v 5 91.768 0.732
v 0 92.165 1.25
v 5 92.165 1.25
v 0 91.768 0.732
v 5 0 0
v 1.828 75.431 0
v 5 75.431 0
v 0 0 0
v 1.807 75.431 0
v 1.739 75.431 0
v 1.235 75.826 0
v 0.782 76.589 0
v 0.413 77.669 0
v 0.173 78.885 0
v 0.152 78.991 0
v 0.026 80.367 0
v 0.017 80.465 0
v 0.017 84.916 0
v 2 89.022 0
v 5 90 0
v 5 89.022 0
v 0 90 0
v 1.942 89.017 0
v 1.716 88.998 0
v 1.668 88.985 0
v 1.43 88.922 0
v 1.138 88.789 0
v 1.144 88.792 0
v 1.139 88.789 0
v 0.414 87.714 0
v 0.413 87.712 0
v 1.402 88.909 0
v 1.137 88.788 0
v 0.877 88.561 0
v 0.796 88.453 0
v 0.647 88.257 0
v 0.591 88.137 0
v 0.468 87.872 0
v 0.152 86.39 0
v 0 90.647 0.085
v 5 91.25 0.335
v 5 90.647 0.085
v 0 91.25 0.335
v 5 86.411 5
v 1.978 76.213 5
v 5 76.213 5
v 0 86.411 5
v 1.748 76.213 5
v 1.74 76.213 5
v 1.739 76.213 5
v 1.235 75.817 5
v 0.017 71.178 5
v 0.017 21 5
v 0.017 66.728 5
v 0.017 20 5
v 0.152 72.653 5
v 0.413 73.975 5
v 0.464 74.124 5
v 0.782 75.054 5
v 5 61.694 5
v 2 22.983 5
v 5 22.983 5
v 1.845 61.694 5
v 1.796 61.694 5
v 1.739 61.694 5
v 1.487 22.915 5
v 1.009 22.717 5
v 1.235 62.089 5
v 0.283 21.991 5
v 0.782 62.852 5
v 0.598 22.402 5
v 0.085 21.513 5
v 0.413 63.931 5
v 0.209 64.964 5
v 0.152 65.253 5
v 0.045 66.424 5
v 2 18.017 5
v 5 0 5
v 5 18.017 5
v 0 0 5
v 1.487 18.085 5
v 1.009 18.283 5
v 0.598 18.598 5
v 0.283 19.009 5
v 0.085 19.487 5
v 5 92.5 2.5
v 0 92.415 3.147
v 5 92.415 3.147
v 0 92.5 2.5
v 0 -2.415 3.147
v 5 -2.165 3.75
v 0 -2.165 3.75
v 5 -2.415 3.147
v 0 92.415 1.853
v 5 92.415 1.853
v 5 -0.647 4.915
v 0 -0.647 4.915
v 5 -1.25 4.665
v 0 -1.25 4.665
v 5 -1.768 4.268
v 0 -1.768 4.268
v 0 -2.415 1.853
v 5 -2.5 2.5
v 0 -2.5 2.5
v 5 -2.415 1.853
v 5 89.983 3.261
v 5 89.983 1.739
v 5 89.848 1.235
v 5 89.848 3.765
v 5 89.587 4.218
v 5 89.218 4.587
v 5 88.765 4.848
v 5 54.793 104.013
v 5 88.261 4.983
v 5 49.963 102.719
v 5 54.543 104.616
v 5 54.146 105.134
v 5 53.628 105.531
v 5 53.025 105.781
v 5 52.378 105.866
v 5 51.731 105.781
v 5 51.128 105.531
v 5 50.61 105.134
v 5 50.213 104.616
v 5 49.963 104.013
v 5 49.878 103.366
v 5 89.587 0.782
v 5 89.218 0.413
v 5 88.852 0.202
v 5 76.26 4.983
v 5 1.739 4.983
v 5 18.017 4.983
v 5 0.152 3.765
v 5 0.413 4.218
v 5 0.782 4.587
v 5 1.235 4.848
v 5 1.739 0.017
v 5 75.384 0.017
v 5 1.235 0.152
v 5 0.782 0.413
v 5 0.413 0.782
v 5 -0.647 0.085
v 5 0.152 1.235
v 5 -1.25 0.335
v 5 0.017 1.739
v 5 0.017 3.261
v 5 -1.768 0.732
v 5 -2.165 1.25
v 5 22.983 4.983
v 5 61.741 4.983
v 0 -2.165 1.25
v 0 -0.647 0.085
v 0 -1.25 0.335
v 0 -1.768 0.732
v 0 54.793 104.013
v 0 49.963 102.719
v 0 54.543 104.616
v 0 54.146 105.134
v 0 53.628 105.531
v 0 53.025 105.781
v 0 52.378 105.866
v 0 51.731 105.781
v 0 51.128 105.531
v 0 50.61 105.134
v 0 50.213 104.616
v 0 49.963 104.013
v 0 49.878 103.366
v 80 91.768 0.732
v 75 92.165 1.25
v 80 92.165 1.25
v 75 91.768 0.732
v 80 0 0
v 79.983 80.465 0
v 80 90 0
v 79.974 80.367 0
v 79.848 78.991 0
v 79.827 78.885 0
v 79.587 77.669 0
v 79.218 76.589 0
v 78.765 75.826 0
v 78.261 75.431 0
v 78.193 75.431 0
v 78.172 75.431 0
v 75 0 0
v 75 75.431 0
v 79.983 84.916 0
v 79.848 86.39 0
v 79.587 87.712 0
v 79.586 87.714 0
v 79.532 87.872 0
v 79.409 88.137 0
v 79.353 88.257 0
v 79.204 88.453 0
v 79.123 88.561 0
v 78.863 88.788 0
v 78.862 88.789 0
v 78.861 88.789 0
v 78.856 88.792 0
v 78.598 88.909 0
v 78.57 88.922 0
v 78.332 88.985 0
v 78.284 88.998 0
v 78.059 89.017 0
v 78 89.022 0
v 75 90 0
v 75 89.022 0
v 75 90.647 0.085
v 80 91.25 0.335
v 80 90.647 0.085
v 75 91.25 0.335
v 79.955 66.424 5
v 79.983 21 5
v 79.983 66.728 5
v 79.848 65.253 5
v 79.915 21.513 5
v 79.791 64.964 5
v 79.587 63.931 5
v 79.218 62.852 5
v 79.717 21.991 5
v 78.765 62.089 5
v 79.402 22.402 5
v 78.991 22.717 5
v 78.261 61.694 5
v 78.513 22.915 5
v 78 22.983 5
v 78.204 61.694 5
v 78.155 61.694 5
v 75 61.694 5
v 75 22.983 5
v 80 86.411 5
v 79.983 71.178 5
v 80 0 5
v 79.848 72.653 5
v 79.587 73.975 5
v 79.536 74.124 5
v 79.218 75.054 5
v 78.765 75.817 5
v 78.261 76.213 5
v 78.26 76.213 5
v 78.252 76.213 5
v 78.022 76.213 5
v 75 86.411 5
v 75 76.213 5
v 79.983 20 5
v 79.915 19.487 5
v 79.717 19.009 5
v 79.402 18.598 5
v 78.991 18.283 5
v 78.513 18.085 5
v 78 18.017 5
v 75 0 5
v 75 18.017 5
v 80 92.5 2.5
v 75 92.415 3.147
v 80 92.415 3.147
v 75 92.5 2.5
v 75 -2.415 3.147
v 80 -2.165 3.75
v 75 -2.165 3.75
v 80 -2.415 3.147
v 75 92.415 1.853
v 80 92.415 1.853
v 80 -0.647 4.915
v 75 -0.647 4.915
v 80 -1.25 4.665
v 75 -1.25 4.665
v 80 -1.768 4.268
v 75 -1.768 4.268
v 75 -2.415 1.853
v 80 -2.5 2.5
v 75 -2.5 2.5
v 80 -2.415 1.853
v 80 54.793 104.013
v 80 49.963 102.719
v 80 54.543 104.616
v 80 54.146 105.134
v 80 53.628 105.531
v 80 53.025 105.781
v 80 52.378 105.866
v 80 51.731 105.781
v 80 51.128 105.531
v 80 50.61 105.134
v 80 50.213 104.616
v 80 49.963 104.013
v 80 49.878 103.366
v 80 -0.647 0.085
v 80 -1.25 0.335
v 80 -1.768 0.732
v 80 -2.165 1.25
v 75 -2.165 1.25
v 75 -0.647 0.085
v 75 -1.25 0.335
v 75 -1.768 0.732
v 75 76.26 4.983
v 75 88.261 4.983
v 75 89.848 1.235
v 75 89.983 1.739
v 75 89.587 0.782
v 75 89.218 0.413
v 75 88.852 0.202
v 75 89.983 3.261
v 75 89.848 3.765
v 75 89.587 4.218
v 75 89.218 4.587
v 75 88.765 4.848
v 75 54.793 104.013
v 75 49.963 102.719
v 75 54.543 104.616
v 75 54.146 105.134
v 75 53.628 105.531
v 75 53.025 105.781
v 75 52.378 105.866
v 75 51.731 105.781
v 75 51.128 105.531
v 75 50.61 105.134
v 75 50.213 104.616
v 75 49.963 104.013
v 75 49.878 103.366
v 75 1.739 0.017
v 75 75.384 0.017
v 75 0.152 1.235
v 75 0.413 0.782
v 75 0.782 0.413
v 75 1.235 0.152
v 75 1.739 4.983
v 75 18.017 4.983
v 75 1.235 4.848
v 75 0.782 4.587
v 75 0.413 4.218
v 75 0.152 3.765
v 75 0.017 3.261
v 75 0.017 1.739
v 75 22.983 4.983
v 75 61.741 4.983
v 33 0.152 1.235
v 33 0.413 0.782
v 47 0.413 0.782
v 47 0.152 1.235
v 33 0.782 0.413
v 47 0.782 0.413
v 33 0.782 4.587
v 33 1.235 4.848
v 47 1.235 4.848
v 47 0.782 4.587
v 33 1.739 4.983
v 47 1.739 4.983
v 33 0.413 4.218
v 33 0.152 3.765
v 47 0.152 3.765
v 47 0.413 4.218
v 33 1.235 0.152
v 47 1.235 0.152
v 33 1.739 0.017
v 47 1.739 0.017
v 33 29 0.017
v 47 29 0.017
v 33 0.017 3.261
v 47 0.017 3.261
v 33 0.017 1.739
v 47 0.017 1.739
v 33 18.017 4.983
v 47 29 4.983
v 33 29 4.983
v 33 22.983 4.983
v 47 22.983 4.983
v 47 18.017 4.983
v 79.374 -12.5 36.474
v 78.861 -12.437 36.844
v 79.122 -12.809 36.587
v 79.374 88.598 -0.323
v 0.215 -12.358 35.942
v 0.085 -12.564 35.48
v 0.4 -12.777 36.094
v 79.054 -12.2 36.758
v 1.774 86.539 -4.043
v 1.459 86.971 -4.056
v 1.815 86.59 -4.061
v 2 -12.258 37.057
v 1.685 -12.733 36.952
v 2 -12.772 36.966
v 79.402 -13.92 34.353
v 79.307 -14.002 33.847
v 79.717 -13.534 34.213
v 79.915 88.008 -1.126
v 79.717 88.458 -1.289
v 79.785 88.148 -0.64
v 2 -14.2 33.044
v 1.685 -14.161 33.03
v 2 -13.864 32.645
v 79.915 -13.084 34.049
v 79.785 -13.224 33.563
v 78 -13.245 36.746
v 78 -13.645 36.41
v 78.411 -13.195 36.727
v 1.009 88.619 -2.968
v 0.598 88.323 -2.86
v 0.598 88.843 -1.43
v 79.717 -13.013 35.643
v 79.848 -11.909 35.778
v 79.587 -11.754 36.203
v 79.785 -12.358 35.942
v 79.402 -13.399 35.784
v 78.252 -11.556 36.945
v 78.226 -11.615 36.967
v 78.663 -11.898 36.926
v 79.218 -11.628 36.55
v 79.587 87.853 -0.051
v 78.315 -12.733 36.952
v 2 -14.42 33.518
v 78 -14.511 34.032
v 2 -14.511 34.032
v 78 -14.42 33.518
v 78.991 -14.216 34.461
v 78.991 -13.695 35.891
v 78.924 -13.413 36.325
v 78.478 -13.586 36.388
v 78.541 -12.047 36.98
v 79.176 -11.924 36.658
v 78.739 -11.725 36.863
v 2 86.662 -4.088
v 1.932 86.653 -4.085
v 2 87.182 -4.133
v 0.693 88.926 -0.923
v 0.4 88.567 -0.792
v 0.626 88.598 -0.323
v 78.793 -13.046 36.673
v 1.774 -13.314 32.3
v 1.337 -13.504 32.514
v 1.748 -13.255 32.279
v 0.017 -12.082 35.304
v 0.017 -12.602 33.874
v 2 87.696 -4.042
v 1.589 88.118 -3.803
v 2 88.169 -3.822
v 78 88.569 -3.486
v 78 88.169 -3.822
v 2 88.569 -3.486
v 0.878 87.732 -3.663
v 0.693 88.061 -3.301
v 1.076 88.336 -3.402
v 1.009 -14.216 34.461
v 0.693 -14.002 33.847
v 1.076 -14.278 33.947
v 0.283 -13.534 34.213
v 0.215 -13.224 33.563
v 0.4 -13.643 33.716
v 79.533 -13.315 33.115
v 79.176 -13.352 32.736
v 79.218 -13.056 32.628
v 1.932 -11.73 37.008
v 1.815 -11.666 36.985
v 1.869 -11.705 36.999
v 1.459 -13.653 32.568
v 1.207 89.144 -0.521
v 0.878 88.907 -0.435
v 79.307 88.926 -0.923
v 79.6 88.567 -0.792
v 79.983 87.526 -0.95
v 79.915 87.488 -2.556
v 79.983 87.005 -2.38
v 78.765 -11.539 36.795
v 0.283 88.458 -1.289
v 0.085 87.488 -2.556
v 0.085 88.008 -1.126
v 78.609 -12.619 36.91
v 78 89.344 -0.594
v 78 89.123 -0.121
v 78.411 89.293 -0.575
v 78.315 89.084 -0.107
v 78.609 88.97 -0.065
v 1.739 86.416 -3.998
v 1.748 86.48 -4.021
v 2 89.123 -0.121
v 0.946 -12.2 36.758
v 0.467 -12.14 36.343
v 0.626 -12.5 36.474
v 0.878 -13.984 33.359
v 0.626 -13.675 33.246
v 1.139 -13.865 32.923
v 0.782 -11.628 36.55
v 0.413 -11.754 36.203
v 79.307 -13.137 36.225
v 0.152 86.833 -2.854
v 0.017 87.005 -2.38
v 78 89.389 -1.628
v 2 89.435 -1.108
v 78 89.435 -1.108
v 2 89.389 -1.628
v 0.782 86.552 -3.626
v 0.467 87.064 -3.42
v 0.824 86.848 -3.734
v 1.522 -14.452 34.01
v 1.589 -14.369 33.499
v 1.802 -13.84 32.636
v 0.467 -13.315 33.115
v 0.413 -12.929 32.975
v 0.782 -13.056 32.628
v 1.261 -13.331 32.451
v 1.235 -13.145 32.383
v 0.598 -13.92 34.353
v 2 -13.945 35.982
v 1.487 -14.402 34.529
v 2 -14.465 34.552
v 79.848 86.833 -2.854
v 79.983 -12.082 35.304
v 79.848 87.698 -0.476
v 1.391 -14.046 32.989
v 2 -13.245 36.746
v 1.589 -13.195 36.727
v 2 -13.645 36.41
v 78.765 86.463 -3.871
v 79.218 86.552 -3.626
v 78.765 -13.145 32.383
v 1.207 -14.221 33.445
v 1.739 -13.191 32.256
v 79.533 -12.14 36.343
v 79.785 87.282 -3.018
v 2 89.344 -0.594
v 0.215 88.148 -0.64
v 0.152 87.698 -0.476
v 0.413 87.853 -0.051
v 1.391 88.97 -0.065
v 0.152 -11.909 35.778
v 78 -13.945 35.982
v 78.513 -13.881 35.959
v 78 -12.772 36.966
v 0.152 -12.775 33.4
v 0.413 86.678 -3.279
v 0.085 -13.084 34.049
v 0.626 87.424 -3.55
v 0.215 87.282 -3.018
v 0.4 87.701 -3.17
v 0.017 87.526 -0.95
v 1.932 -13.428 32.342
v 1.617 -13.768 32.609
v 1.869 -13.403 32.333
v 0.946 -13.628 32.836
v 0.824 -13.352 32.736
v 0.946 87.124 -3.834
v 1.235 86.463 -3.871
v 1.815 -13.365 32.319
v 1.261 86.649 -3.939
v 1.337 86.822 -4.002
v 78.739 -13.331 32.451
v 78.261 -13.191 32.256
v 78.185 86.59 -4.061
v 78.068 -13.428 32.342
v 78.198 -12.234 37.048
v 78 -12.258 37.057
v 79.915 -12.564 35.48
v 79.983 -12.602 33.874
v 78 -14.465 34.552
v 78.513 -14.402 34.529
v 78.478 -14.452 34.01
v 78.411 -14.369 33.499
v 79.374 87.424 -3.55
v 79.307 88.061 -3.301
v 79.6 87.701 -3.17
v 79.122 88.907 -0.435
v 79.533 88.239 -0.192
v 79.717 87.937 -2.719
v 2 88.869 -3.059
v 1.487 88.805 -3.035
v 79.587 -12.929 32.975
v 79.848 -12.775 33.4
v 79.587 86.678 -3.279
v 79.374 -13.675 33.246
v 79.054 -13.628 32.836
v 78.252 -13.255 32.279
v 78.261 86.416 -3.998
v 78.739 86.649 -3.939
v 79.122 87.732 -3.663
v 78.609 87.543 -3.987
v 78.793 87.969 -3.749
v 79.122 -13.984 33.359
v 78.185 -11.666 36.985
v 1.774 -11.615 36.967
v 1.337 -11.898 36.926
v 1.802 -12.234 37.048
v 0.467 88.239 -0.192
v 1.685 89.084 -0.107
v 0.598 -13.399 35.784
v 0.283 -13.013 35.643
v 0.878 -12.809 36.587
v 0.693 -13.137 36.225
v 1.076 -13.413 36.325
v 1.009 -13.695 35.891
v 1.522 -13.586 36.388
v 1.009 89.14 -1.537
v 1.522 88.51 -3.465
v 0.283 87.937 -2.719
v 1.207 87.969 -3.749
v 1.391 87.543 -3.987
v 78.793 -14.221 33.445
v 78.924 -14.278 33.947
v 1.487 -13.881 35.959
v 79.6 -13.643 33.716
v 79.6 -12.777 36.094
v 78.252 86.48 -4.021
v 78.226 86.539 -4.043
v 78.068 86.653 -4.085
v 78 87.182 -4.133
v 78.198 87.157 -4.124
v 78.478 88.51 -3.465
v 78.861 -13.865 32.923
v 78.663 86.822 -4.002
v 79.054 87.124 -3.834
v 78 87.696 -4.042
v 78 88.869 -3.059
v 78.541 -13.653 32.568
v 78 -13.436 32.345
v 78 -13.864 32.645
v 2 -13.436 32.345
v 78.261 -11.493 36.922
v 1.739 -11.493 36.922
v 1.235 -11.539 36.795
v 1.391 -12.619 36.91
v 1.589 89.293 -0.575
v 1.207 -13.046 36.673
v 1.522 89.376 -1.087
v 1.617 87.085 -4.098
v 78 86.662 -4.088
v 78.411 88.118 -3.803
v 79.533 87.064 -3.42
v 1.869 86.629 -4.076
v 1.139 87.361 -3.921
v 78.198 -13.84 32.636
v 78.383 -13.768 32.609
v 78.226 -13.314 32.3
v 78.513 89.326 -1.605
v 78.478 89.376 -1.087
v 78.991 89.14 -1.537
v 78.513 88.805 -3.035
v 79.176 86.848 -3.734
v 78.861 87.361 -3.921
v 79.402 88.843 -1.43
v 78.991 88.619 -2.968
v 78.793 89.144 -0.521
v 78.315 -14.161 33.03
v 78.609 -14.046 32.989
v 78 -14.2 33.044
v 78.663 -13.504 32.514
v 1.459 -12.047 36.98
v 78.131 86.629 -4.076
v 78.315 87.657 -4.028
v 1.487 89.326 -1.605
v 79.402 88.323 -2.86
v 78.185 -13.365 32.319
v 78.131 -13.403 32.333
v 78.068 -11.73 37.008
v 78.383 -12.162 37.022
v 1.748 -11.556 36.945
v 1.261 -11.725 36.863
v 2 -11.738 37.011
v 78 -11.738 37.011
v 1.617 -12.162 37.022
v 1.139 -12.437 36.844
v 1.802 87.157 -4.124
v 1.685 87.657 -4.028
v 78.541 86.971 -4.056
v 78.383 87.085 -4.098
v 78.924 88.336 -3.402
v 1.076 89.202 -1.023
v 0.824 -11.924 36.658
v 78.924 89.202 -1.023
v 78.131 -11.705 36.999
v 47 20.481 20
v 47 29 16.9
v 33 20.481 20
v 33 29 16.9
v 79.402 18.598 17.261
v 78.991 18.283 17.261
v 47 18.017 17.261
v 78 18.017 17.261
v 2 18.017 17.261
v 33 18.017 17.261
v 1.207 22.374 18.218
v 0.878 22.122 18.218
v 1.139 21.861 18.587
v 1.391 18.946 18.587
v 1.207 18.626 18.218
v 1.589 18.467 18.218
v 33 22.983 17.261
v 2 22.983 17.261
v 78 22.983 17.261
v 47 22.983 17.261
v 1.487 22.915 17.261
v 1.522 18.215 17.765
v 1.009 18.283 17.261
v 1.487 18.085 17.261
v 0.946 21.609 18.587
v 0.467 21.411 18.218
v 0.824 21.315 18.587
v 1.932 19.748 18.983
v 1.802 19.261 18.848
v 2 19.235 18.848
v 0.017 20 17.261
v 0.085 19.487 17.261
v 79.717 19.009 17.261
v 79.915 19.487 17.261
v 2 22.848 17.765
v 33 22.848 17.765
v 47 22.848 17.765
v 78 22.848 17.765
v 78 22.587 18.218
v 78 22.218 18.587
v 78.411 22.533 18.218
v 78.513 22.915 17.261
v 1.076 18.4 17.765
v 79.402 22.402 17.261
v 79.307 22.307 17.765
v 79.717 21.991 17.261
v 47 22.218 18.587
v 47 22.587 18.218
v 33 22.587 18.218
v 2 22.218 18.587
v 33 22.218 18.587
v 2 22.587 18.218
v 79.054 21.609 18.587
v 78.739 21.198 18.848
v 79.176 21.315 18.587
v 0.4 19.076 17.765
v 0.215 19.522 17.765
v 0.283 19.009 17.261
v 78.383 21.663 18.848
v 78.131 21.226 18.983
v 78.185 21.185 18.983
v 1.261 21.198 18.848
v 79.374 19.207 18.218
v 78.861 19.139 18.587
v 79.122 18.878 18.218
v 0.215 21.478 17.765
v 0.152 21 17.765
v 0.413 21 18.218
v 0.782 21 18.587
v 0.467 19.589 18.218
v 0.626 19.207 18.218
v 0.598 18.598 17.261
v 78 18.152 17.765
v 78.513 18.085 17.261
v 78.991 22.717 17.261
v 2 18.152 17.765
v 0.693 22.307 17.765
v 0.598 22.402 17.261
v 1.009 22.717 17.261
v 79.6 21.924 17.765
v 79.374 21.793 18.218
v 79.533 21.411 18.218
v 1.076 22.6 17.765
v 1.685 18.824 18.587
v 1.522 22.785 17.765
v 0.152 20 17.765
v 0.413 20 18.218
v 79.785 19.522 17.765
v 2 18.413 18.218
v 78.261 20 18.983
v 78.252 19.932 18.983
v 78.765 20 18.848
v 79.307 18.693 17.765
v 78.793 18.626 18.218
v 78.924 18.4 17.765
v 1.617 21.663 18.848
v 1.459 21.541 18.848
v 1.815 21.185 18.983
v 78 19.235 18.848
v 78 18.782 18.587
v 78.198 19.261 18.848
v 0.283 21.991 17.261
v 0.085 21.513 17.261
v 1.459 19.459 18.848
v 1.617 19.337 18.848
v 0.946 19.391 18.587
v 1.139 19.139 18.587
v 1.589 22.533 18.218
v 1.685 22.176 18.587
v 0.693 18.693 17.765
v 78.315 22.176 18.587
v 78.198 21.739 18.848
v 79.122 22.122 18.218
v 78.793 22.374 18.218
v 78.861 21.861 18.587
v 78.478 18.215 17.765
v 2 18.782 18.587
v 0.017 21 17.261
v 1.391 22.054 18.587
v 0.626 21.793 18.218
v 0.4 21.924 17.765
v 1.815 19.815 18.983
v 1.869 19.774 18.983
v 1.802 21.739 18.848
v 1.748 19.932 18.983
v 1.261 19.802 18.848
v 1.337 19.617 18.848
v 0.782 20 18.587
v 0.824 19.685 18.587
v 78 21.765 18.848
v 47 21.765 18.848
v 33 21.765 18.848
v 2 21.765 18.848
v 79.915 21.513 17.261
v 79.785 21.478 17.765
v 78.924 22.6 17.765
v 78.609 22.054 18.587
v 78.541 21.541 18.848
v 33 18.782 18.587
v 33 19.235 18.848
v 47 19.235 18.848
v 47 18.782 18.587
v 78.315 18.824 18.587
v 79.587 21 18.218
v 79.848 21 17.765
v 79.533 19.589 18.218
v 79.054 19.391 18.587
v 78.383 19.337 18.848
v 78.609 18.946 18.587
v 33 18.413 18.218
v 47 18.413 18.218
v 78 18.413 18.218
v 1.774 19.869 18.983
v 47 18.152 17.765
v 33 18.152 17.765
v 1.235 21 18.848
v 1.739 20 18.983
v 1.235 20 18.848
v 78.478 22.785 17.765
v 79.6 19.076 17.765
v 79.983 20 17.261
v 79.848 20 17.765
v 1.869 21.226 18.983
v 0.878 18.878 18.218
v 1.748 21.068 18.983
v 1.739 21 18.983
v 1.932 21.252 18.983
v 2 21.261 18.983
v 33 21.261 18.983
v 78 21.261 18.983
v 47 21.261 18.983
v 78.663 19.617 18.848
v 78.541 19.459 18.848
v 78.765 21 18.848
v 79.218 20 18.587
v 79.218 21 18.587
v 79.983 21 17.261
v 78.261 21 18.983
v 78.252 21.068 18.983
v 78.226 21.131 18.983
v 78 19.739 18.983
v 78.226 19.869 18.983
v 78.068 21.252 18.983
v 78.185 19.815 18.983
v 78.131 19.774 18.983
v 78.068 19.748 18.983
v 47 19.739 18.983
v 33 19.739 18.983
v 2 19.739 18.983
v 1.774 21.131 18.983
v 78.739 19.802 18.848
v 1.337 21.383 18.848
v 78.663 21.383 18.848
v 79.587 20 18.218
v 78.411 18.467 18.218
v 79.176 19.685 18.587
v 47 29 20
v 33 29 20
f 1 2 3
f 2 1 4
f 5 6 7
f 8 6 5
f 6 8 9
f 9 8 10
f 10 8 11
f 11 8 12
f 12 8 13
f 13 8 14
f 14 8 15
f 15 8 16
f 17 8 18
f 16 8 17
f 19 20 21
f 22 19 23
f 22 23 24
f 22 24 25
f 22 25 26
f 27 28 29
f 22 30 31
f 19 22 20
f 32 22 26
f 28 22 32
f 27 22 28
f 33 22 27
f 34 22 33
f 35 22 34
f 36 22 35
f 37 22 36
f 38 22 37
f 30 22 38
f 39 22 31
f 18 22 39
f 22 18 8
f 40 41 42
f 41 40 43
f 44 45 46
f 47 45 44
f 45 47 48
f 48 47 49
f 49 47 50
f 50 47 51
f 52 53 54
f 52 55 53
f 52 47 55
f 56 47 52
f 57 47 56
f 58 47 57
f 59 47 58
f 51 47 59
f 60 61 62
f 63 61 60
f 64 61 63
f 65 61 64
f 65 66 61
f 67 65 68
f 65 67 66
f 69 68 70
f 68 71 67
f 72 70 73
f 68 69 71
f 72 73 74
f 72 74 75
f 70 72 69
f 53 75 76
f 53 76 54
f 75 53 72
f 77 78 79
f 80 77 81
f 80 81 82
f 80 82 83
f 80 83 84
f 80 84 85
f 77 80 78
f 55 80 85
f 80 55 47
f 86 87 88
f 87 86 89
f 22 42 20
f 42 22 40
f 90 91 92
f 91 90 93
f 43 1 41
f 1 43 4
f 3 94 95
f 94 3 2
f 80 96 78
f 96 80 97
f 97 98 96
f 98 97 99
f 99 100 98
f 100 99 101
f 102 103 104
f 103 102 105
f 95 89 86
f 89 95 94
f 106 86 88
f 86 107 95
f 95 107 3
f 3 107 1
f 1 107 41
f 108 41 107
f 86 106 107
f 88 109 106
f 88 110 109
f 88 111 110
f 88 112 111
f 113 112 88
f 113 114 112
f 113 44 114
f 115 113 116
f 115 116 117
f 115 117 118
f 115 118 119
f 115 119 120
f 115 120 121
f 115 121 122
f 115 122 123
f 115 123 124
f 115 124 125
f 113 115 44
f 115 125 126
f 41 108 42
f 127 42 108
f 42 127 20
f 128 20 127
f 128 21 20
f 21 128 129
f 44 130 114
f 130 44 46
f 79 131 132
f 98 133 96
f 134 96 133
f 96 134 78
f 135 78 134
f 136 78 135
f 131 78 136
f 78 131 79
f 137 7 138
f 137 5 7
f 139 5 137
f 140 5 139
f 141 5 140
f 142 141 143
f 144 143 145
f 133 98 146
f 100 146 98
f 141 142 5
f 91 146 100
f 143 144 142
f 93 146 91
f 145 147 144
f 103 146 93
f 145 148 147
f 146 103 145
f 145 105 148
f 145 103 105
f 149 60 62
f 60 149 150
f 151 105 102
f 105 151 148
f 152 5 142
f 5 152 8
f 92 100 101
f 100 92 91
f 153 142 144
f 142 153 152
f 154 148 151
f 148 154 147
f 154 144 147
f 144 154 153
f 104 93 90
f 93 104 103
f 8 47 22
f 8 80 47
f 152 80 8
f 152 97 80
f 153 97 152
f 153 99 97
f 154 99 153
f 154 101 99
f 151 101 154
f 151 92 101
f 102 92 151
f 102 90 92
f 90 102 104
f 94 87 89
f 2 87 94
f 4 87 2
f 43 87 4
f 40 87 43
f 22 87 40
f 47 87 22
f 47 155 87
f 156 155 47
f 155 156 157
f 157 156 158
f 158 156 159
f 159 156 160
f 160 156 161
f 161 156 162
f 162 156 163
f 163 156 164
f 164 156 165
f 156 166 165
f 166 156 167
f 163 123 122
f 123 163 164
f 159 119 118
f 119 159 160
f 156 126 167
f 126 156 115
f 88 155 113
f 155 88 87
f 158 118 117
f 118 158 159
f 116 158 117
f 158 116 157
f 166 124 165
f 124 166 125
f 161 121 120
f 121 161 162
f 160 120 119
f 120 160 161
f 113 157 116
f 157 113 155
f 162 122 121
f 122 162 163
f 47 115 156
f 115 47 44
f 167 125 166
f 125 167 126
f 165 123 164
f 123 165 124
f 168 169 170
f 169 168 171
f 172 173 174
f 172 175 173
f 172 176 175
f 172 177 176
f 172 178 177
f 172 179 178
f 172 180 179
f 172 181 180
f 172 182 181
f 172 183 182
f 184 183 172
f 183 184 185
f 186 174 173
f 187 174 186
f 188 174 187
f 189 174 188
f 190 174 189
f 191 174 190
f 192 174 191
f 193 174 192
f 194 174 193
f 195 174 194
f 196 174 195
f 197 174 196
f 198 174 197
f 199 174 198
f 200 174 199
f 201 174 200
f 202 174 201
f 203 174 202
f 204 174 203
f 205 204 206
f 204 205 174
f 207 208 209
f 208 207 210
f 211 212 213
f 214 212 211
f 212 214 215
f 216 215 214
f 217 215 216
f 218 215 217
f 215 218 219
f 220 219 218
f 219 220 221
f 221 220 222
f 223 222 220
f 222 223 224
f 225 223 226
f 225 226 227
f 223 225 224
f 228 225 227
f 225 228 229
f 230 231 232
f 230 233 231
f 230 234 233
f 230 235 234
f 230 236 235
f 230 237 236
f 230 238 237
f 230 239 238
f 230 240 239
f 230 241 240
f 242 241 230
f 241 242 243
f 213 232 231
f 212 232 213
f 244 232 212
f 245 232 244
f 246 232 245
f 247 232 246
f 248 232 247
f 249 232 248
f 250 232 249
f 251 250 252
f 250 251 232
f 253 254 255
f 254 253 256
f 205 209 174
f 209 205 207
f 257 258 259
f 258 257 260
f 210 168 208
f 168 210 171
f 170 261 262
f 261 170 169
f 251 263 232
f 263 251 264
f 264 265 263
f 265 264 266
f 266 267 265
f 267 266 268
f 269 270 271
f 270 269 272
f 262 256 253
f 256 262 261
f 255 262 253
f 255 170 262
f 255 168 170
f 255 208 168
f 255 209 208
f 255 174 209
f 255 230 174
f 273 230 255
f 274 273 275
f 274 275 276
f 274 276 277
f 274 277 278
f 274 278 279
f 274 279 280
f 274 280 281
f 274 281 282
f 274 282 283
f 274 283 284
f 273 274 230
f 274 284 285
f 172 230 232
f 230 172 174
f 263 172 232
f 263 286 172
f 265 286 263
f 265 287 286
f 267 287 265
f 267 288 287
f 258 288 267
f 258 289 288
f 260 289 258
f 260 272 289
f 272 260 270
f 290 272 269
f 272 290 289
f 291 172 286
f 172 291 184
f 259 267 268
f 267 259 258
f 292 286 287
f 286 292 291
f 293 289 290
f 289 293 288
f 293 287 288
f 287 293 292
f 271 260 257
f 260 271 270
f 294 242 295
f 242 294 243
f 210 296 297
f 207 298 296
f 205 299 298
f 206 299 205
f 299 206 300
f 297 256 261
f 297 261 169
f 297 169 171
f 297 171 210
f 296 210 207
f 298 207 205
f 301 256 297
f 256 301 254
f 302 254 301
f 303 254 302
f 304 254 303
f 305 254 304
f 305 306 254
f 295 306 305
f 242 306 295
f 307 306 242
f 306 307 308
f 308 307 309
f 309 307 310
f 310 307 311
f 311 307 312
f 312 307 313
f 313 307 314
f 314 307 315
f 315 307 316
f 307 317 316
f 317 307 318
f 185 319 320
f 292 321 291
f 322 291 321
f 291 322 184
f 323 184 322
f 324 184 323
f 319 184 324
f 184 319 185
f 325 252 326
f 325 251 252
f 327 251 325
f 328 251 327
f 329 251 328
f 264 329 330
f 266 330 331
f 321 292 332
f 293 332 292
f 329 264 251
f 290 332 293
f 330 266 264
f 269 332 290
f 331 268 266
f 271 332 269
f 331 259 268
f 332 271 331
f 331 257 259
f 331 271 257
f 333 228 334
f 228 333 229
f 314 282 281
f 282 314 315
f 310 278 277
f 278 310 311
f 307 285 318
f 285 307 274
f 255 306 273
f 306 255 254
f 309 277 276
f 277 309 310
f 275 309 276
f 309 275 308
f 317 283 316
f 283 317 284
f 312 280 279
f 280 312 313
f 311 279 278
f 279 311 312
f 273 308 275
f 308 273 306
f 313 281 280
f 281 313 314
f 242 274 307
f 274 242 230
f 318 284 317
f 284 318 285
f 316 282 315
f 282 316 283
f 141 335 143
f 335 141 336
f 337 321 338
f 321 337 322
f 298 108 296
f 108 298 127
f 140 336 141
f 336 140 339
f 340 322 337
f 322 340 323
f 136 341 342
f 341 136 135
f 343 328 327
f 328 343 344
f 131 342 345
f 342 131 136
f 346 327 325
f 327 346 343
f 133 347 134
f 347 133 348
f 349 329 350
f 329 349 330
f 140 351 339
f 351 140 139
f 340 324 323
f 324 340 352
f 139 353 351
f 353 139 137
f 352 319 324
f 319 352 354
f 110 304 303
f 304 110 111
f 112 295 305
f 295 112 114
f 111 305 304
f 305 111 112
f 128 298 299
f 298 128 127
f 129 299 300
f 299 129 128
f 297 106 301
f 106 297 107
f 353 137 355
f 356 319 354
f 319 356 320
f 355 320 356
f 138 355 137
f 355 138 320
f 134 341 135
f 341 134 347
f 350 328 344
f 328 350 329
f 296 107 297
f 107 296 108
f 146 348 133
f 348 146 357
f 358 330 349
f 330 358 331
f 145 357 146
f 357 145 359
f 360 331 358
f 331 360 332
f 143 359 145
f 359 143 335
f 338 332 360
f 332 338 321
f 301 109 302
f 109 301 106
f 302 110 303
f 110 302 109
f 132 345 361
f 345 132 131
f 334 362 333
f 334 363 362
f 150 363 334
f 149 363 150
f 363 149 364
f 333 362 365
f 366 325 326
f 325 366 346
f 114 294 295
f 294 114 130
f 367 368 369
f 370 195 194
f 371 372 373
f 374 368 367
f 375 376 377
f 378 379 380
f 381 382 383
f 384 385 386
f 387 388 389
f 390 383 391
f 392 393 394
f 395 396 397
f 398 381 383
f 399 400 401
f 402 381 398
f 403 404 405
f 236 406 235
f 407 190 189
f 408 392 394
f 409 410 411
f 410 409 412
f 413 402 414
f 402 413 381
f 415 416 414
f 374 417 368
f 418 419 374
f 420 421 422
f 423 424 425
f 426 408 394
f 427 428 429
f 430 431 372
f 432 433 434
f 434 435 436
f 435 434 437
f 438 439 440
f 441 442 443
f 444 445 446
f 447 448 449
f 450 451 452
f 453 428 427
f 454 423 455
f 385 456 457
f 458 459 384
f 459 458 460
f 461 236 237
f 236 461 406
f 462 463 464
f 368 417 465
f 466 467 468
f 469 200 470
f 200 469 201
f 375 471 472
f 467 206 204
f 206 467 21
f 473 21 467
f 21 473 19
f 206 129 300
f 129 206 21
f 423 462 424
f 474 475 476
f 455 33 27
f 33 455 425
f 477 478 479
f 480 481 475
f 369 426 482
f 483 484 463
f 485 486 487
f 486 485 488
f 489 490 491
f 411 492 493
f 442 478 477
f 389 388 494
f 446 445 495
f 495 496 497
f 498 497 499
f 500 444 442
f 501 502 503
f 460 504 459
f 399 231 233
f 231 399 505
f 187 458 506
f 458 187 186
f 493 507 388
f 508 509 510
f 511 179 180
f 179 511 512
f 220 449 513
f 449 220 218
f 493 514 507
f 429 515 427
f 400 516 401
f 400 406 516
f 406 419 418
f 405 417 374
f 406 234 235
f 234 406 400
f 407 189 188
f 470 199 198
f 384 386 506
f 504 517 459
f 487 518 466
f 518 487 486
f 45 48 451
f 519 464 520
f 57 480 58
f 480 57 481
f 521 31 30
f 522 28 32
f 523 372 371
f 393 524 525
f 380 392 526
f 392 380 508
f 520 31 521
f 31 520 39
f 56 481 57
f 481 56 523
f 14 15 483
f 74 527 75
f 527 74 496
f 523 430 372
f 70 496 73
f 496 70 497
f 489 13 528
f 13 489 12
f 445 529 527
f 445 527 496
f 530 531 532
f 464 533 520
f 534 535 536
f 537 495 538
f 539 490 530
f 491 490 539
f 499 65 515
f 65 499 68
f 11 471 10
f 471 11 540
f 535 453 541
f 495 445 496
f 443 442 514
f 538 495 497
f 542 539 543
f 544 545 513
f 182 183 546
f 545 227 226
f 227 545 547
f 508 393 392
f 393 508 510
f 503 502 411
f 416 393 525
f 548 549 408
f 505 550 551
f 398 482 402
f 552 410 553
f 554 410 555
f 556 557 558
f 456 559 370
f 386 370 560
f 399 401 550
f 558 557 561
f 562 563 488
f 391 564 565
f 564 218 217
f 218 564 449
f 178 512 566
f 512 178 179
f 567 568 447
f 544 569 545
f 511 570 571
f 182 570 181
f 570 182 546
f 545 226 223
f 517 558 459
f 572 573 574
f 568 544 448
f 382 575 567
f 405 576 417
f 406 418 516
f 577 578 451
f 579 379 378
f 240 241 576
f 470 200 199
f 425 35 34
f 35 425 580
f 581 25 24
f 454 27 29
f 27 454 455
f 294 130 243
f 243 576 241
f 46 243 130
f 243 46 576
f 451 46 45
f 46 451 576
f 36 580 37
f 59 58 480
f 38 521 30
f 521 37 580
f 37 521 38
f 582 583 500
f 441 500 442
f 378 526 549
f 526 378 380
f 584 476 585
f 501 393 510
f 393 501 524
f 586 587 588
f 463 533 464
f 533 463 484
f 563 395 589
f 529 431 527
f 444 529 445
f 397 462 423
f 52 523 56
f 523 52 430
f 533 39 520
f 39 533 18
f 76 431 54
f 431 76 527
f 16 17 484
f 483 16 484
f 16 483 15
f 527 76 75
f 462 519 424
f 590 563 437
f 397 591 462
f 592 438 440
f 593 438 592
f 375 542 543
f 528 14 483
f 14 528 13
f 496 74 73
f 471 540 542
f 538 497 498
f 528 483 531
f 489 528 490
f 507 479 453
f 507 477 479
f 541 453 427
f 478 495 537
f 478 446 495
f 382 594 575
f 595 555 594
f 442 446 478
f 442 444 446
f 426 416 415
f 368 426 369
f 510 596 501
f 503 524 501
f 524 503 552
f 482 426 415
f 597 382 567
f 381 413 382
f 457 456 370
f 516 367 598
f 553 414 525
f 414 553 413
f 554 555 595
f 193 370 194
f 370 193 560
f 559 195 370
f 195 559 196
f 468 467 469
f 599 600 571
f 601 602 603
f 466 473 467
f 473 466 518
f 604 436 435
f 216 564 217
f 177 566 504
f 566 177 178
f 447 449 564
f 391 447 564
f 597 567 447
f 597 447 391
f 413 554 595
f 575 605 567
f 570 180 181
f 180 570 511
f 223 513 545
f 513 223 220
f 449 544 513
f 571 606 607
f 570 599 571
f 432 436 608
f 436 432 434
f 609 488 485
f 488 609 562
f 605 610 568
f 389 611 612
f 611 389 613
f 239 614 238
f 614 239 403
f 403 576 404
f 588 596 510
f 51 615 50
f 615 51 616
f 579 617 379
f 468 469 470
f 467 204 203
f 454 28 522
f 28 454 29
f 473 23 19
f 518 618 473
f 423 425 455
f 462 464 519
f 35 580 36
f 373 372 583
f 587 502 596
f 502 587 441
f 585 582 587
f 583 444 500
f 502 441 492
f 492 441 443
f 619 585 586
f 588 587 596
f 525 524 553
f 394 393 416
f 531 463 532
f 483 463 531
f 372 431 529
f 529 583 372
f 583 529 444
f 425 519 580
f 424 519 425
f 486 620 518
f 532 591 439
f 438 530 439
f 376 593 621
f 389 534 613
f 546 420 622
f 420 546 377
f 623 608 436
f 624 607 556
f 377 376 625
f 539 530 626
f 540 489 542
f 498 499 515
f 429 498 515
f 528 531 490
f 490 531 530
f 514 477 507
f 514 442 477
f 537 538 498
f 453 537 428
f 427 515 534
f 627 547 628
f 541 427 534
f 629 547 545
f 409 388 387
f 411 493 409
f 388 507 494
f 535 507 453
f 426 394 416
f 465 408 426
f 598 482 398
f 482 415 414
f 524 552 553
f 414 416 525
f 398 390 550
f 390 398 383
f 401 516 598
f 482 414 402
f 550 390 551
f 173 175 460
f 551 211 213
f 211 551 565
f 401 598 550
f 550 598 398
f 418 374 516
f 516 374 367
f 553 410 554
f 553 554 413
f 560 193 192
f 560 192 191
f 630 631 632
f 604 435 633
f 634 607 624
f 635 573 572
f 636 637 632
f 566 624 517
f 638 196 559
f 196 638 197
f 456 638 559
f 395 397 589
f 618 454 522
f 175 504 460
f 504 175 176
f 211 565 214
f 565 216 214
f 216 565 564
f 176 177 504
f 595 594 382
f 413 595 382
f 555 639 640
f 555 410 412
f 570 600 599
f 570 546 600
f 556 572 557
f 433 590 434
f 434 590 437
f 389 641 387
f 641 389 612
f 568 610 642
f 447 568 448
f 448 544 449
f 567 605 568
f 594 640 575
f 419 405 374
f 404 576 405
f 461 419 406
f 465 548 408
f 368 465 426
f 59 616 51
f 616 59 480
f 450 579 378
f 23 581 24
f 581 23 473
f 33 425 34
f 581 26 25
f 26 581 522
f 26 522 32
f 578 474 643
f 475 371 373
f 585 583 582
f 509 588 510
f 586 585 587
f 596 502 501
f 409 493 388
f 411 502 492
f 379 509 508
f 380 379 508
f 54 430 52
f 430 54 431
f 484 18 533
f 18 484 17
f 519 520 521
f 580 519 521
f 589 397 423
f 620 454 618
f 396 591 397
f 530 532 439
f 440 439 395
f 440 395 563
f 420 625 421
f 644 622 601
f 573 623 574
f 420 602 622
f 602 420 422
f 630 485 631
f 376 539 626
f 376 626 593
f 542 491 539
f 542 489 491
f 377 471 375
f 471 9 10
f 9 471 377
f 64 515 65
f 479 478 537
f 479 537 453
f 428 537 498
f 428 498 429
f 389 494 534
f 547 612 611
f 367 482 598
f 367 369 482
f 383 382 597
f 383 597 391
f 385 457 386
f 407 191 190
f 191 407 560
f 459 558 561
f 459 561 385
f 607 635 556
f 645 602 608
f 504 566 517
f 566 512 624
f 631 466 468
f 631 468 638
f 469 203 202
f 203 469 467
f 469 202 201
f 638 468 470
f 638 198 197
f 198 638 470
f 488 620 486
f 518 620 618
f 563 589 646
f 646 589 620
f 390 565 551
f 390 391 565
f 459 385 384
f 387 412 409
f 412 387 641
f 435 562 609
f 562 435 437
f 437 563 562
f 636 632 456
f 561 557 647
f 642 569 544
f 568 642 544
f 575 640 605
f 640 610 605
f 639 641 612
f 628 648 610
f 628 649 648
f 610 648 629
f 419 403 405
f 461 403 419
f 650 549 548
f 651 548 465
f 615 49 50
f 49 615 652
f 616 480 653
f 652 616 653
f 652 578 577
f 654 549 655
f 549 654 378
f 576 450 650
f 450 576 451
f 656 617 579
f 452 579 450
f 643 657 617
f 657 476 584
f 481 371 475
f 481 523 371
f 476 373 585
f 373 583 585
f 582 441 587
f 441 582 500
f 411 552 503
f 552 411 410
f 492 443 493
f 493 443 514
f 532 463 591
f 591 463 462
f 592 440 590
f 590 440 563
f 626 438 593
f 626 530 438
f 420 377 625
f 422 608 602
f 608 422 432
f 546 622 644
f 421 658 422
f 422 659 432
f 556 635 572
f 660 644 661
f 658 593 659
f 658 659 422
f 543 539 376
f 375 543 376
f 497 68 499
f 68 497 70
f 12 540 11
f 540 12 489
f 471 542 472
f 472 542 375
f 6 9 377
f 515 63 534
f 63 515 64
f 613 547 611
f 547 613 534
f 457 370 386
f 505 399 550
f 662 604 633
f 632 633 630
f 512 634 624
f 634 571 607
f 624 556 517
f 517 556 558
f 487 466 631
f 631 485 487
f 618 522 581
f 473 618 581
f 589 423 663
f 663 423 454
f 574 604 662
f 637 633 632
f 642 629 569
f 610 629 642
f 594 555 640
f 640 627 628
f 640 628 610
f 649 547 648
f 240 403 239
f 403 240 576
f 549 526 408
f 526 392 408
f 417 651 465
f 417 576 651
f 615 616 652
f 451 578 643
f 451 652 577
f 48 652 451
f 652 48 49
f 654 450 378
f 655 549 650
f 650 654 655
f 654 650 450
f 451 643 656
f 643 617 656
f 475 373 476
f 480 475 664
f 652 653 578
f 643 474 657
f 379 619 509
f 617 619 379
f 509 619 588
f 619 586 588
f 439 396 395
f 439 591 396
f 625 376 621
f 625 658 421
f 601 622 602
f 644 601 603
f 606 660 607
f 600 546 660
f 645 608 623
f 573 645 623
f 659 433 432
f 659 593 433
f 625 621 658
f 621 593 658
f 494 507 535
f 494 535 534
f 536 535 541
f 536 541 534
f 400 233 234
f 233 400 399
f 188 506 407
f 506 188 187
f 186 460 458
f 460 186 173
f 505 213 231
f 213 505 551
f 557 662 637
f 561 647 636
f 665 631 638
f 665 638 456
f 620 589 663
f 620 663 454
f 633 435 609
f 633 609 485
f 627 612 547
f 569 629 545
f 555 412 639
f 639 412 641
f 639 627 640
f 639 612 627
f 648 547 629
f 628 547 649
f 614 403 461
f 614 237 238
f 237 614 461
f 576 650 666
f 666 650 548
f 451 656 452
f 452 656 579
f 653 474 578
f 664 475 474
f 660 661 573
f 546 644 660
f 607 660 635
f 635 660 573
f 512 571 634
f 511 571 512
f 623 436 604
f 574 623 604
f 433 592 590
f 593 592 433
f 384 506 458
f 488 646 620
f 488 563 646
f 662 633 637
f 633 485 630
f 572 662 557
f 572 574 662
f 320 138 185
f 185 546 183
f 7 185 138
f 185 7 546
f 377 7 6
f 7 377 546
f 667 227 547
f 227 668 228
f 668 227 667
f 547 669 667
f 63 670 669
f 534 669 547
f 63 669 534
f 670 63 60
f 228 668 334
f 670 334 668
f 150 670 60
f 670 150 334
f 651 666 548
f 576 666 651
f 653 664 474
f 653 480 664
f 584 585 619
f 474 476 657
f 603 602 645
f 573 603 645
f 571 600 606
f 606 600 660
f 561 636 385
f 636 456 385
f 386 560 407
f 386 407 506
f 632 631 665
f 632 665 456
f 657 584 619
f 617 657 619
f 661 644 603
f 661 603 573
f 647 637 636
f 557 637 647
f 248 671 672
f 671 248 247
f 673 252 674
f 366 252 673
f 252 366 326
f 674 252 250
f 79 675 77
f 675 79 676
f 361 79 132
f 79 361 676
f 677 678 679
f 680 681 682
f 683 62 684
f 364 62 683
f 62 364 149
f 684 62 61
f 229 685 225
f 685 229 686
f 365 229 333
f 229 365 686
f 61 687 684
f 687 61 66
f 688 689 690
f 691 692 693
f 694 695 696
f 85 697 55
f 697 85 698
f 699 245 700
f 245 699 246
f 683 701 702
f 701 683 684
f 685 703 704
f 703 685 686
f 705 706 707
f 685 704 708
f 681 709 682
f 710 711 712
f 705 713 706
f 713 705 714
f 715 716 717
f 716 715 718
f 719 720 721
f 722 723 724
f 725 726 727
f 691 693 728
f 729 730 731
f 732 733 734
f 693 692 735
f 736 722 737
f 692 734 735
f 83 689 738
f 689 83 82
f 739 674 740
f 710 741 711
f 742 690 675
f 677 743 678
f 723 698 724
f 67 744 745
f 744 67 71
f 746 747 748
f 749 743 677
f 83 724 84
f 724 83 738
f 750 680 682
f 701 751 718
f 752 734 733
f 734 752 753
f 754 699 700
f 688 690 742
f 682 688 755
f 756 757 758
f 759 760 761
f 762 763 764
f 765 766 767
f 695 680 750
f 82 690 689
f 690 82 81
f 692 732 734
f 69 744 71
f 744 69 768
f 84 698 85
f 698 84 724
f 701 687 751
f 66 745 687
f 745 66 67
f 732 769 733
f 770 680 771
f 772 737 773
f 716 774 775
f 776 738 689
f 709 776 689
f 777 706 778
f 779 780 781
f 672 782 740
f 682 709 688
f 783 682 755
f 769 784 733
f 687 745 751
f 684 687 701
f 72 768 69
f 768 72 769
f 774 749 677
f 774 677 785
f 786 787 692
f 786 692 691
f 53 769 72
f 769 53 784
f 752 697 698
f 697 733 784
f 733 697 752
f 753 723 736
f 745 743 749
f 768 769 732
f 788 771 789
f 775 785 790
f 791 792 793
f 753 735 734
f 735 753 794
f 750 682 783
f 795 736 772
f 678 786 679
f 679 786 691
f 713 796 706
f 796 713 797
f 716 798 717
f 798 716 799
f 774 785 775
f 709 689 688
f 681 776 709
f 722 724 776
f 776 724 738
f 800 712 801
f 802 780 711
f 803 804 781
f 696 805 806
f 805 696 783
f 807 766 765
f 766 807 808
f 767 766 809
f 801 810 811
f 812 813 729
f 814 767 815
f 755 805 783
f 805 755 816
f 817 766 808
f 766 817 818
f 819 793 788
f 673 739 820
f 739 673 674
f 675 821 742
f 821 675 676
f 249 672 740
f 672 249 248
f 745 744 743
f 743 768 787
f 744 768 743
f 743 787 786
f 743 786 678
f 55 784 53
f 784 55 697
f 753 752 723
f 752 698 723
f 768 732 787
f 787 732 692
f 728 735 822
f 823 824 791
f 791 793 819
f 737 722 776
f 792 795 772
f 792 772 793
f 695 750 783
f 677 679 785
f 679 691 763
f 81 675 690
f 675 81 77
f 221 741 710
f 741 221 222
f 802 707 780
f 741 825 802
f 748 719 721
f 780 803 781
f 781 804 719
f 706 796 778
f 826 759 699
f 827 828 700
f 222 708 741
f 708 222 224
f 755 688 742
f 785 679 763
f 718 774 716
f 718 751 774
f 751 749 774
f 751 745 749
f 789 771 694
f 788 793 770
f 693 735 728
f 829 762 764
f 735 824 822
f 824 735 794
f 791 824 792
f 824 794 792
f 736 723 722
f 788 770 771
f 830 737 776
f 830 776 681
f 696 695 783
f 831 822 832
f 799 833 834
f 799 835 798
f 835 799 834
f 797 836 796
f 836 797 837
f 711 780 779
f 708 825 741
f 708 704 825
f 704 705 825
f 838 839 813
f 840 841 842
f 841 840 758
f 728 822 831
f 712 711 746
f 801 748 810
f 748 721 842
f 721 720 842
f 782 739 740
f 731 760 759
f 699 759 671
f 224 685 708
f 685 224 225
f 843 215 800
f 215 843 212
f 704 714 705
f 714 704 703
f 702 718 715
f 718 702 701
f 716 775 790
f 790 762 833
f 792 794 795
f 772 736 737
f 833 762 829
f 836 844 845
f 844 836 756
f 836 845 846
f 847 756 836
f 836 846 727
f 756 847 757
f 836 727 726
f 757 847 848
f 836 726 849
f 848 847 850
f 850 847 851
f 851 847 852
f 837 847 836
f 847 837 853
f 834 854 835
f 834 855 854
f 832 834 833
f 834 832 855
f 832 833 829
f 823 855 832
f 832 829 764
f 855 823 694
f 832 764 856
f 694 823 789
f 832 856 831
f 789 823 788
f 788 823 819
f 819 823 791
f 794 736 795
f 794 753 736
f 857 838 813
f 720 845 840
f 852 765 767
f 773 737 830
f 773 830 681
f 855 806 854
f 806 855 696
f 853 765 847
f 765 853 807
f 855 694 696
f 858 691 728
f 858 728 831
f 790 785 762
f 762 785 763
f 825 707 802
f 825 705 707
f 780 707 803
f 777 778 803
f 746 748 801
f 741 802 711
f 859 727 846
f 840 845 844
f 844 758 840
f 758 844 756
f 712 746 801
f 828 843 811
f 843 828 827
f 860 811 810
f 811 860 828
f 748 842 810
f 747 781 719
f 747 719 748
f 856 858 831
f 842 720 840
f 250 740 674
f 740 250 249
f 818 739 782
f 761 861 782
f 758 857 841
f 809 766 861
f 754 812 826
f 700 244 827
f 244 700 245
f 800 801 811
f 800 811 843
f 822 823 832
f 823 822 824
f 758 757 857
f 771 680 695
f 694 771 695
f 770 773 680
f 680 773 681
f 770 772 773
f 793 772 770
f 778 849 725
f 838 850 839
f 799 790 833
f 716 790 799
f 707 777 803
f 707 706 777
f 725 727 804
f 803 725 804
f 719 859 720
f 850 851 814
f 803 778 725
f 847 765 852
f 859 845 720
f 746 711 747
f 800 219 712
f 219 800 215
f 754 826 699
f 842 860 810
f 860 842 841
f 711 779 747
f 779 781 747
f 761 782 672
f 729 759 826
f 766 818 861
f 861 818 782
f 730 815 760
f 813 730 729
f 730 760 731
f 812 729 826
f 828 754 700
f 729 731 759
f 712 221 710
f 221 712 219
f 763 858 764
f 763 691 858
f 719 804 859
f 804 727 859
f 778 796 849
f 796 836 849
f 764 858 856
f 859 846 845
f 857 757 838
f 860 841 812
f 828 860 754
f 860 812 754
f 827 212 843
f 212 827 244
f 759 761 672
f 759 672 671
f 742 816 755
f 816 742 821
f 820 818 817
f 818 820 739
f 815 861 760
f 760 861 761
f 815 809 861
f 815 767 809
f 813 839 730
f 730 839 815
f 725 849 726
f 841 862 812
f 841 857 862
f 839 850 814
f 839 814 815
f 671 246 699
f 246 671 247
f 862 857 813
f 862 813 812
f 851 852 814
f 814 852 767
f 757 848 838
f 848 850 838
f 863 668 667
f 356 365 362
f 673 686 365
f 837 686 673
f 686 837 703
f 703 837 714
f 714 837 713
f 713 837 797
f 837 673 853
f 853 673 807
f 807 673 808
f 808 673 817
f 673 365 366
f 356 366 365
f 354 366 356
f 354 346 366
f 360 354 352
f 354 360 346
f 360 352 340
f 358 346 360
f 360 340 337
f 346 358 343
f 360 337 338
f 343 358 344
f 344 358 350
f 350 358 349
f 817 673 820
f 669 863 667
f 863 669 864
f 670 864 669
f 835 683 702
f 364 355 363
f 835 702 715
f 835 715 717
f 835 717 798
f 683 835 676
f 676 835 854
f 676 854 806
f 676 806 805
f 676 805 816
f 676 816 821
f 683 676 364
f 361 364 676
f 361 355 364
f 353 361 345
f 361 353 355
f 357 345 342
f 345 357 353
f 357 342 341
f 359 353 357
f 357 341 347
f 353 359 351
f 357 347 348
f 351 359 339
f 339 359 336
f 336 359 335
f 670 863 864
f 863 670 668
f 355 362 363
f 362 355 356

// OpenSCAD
// Phone stand: tilted back plate, base and front lip, rounded with hull/minkowski.
width = 80;        // stand width (mm)
depth = 90;        // base depth (mm)
height = 110;      // back plate height (mm)
thickness = 5;     // wall thickness (mm)
angle = 70;        // back plate angle from the table (degrees)
lip = 14;          // front lip height (mm)
round_r = 2;       // edge rounding radius (mm)
slot_w = 14;       // charging cable slot width (mm)
$fn = 24;

module rounded_plate(l, w, t, r) {
  // Rounded-edge plate: minkowski of a shrunk box with a sphere.
  minkowski() {
    translate([r, r, r]) cube([l - 2 * r, w - 2 * r, t - 2 * r]);
    sphere(r = r);
  }
}

module side_profile() {
  // Hull between rods at the base ends and the top of the back plate.
  rod = thickness;
  hull() {
    translate([0, 0, rod / 2]) rotate([0, 90, 0]) cylinder(d = rod, h = thickness);
    translate([0, depth, rod / 2]) rotate([0, 90, 0]) cylinder(d = rod, h = thickness);
  }
  hull() {
    translate([0, depth, rod / 2]) rotate([0, 90, 0]) cylinder(d = rod, h = thickness);
    translate([0, depth - height * cos(angle), height * sin(angle)])
      rotate([0, 90, 0]) cylinder(d = rod, h = thickness);
  }
}

difference() {
  union() {
    // base
    rounded_plate(width, depth, thickness, round_r);
    // back plate
    translate([0, depth, 0]) rotate([angle, 0, 0]) translate([0, -thickness, 0])
      rotate([90, 0, 0]) translate([0, 0, -thickness]) rounded_plate(width, height, thickness, round_r);
    // front lip
    translate([0, 18, 0]) rounded_plate(width, thickness, lip + thickness, round_r);
    // side ribs
    side_profile();
    translate([width - thickness, 0, 0]) side_profile();
  }
  // cable slot through the lip and base front
  translate([(width - slot_w) / 2, -1, -1]) cube([slot_w, 30, lip + thickness + 2]);
}
